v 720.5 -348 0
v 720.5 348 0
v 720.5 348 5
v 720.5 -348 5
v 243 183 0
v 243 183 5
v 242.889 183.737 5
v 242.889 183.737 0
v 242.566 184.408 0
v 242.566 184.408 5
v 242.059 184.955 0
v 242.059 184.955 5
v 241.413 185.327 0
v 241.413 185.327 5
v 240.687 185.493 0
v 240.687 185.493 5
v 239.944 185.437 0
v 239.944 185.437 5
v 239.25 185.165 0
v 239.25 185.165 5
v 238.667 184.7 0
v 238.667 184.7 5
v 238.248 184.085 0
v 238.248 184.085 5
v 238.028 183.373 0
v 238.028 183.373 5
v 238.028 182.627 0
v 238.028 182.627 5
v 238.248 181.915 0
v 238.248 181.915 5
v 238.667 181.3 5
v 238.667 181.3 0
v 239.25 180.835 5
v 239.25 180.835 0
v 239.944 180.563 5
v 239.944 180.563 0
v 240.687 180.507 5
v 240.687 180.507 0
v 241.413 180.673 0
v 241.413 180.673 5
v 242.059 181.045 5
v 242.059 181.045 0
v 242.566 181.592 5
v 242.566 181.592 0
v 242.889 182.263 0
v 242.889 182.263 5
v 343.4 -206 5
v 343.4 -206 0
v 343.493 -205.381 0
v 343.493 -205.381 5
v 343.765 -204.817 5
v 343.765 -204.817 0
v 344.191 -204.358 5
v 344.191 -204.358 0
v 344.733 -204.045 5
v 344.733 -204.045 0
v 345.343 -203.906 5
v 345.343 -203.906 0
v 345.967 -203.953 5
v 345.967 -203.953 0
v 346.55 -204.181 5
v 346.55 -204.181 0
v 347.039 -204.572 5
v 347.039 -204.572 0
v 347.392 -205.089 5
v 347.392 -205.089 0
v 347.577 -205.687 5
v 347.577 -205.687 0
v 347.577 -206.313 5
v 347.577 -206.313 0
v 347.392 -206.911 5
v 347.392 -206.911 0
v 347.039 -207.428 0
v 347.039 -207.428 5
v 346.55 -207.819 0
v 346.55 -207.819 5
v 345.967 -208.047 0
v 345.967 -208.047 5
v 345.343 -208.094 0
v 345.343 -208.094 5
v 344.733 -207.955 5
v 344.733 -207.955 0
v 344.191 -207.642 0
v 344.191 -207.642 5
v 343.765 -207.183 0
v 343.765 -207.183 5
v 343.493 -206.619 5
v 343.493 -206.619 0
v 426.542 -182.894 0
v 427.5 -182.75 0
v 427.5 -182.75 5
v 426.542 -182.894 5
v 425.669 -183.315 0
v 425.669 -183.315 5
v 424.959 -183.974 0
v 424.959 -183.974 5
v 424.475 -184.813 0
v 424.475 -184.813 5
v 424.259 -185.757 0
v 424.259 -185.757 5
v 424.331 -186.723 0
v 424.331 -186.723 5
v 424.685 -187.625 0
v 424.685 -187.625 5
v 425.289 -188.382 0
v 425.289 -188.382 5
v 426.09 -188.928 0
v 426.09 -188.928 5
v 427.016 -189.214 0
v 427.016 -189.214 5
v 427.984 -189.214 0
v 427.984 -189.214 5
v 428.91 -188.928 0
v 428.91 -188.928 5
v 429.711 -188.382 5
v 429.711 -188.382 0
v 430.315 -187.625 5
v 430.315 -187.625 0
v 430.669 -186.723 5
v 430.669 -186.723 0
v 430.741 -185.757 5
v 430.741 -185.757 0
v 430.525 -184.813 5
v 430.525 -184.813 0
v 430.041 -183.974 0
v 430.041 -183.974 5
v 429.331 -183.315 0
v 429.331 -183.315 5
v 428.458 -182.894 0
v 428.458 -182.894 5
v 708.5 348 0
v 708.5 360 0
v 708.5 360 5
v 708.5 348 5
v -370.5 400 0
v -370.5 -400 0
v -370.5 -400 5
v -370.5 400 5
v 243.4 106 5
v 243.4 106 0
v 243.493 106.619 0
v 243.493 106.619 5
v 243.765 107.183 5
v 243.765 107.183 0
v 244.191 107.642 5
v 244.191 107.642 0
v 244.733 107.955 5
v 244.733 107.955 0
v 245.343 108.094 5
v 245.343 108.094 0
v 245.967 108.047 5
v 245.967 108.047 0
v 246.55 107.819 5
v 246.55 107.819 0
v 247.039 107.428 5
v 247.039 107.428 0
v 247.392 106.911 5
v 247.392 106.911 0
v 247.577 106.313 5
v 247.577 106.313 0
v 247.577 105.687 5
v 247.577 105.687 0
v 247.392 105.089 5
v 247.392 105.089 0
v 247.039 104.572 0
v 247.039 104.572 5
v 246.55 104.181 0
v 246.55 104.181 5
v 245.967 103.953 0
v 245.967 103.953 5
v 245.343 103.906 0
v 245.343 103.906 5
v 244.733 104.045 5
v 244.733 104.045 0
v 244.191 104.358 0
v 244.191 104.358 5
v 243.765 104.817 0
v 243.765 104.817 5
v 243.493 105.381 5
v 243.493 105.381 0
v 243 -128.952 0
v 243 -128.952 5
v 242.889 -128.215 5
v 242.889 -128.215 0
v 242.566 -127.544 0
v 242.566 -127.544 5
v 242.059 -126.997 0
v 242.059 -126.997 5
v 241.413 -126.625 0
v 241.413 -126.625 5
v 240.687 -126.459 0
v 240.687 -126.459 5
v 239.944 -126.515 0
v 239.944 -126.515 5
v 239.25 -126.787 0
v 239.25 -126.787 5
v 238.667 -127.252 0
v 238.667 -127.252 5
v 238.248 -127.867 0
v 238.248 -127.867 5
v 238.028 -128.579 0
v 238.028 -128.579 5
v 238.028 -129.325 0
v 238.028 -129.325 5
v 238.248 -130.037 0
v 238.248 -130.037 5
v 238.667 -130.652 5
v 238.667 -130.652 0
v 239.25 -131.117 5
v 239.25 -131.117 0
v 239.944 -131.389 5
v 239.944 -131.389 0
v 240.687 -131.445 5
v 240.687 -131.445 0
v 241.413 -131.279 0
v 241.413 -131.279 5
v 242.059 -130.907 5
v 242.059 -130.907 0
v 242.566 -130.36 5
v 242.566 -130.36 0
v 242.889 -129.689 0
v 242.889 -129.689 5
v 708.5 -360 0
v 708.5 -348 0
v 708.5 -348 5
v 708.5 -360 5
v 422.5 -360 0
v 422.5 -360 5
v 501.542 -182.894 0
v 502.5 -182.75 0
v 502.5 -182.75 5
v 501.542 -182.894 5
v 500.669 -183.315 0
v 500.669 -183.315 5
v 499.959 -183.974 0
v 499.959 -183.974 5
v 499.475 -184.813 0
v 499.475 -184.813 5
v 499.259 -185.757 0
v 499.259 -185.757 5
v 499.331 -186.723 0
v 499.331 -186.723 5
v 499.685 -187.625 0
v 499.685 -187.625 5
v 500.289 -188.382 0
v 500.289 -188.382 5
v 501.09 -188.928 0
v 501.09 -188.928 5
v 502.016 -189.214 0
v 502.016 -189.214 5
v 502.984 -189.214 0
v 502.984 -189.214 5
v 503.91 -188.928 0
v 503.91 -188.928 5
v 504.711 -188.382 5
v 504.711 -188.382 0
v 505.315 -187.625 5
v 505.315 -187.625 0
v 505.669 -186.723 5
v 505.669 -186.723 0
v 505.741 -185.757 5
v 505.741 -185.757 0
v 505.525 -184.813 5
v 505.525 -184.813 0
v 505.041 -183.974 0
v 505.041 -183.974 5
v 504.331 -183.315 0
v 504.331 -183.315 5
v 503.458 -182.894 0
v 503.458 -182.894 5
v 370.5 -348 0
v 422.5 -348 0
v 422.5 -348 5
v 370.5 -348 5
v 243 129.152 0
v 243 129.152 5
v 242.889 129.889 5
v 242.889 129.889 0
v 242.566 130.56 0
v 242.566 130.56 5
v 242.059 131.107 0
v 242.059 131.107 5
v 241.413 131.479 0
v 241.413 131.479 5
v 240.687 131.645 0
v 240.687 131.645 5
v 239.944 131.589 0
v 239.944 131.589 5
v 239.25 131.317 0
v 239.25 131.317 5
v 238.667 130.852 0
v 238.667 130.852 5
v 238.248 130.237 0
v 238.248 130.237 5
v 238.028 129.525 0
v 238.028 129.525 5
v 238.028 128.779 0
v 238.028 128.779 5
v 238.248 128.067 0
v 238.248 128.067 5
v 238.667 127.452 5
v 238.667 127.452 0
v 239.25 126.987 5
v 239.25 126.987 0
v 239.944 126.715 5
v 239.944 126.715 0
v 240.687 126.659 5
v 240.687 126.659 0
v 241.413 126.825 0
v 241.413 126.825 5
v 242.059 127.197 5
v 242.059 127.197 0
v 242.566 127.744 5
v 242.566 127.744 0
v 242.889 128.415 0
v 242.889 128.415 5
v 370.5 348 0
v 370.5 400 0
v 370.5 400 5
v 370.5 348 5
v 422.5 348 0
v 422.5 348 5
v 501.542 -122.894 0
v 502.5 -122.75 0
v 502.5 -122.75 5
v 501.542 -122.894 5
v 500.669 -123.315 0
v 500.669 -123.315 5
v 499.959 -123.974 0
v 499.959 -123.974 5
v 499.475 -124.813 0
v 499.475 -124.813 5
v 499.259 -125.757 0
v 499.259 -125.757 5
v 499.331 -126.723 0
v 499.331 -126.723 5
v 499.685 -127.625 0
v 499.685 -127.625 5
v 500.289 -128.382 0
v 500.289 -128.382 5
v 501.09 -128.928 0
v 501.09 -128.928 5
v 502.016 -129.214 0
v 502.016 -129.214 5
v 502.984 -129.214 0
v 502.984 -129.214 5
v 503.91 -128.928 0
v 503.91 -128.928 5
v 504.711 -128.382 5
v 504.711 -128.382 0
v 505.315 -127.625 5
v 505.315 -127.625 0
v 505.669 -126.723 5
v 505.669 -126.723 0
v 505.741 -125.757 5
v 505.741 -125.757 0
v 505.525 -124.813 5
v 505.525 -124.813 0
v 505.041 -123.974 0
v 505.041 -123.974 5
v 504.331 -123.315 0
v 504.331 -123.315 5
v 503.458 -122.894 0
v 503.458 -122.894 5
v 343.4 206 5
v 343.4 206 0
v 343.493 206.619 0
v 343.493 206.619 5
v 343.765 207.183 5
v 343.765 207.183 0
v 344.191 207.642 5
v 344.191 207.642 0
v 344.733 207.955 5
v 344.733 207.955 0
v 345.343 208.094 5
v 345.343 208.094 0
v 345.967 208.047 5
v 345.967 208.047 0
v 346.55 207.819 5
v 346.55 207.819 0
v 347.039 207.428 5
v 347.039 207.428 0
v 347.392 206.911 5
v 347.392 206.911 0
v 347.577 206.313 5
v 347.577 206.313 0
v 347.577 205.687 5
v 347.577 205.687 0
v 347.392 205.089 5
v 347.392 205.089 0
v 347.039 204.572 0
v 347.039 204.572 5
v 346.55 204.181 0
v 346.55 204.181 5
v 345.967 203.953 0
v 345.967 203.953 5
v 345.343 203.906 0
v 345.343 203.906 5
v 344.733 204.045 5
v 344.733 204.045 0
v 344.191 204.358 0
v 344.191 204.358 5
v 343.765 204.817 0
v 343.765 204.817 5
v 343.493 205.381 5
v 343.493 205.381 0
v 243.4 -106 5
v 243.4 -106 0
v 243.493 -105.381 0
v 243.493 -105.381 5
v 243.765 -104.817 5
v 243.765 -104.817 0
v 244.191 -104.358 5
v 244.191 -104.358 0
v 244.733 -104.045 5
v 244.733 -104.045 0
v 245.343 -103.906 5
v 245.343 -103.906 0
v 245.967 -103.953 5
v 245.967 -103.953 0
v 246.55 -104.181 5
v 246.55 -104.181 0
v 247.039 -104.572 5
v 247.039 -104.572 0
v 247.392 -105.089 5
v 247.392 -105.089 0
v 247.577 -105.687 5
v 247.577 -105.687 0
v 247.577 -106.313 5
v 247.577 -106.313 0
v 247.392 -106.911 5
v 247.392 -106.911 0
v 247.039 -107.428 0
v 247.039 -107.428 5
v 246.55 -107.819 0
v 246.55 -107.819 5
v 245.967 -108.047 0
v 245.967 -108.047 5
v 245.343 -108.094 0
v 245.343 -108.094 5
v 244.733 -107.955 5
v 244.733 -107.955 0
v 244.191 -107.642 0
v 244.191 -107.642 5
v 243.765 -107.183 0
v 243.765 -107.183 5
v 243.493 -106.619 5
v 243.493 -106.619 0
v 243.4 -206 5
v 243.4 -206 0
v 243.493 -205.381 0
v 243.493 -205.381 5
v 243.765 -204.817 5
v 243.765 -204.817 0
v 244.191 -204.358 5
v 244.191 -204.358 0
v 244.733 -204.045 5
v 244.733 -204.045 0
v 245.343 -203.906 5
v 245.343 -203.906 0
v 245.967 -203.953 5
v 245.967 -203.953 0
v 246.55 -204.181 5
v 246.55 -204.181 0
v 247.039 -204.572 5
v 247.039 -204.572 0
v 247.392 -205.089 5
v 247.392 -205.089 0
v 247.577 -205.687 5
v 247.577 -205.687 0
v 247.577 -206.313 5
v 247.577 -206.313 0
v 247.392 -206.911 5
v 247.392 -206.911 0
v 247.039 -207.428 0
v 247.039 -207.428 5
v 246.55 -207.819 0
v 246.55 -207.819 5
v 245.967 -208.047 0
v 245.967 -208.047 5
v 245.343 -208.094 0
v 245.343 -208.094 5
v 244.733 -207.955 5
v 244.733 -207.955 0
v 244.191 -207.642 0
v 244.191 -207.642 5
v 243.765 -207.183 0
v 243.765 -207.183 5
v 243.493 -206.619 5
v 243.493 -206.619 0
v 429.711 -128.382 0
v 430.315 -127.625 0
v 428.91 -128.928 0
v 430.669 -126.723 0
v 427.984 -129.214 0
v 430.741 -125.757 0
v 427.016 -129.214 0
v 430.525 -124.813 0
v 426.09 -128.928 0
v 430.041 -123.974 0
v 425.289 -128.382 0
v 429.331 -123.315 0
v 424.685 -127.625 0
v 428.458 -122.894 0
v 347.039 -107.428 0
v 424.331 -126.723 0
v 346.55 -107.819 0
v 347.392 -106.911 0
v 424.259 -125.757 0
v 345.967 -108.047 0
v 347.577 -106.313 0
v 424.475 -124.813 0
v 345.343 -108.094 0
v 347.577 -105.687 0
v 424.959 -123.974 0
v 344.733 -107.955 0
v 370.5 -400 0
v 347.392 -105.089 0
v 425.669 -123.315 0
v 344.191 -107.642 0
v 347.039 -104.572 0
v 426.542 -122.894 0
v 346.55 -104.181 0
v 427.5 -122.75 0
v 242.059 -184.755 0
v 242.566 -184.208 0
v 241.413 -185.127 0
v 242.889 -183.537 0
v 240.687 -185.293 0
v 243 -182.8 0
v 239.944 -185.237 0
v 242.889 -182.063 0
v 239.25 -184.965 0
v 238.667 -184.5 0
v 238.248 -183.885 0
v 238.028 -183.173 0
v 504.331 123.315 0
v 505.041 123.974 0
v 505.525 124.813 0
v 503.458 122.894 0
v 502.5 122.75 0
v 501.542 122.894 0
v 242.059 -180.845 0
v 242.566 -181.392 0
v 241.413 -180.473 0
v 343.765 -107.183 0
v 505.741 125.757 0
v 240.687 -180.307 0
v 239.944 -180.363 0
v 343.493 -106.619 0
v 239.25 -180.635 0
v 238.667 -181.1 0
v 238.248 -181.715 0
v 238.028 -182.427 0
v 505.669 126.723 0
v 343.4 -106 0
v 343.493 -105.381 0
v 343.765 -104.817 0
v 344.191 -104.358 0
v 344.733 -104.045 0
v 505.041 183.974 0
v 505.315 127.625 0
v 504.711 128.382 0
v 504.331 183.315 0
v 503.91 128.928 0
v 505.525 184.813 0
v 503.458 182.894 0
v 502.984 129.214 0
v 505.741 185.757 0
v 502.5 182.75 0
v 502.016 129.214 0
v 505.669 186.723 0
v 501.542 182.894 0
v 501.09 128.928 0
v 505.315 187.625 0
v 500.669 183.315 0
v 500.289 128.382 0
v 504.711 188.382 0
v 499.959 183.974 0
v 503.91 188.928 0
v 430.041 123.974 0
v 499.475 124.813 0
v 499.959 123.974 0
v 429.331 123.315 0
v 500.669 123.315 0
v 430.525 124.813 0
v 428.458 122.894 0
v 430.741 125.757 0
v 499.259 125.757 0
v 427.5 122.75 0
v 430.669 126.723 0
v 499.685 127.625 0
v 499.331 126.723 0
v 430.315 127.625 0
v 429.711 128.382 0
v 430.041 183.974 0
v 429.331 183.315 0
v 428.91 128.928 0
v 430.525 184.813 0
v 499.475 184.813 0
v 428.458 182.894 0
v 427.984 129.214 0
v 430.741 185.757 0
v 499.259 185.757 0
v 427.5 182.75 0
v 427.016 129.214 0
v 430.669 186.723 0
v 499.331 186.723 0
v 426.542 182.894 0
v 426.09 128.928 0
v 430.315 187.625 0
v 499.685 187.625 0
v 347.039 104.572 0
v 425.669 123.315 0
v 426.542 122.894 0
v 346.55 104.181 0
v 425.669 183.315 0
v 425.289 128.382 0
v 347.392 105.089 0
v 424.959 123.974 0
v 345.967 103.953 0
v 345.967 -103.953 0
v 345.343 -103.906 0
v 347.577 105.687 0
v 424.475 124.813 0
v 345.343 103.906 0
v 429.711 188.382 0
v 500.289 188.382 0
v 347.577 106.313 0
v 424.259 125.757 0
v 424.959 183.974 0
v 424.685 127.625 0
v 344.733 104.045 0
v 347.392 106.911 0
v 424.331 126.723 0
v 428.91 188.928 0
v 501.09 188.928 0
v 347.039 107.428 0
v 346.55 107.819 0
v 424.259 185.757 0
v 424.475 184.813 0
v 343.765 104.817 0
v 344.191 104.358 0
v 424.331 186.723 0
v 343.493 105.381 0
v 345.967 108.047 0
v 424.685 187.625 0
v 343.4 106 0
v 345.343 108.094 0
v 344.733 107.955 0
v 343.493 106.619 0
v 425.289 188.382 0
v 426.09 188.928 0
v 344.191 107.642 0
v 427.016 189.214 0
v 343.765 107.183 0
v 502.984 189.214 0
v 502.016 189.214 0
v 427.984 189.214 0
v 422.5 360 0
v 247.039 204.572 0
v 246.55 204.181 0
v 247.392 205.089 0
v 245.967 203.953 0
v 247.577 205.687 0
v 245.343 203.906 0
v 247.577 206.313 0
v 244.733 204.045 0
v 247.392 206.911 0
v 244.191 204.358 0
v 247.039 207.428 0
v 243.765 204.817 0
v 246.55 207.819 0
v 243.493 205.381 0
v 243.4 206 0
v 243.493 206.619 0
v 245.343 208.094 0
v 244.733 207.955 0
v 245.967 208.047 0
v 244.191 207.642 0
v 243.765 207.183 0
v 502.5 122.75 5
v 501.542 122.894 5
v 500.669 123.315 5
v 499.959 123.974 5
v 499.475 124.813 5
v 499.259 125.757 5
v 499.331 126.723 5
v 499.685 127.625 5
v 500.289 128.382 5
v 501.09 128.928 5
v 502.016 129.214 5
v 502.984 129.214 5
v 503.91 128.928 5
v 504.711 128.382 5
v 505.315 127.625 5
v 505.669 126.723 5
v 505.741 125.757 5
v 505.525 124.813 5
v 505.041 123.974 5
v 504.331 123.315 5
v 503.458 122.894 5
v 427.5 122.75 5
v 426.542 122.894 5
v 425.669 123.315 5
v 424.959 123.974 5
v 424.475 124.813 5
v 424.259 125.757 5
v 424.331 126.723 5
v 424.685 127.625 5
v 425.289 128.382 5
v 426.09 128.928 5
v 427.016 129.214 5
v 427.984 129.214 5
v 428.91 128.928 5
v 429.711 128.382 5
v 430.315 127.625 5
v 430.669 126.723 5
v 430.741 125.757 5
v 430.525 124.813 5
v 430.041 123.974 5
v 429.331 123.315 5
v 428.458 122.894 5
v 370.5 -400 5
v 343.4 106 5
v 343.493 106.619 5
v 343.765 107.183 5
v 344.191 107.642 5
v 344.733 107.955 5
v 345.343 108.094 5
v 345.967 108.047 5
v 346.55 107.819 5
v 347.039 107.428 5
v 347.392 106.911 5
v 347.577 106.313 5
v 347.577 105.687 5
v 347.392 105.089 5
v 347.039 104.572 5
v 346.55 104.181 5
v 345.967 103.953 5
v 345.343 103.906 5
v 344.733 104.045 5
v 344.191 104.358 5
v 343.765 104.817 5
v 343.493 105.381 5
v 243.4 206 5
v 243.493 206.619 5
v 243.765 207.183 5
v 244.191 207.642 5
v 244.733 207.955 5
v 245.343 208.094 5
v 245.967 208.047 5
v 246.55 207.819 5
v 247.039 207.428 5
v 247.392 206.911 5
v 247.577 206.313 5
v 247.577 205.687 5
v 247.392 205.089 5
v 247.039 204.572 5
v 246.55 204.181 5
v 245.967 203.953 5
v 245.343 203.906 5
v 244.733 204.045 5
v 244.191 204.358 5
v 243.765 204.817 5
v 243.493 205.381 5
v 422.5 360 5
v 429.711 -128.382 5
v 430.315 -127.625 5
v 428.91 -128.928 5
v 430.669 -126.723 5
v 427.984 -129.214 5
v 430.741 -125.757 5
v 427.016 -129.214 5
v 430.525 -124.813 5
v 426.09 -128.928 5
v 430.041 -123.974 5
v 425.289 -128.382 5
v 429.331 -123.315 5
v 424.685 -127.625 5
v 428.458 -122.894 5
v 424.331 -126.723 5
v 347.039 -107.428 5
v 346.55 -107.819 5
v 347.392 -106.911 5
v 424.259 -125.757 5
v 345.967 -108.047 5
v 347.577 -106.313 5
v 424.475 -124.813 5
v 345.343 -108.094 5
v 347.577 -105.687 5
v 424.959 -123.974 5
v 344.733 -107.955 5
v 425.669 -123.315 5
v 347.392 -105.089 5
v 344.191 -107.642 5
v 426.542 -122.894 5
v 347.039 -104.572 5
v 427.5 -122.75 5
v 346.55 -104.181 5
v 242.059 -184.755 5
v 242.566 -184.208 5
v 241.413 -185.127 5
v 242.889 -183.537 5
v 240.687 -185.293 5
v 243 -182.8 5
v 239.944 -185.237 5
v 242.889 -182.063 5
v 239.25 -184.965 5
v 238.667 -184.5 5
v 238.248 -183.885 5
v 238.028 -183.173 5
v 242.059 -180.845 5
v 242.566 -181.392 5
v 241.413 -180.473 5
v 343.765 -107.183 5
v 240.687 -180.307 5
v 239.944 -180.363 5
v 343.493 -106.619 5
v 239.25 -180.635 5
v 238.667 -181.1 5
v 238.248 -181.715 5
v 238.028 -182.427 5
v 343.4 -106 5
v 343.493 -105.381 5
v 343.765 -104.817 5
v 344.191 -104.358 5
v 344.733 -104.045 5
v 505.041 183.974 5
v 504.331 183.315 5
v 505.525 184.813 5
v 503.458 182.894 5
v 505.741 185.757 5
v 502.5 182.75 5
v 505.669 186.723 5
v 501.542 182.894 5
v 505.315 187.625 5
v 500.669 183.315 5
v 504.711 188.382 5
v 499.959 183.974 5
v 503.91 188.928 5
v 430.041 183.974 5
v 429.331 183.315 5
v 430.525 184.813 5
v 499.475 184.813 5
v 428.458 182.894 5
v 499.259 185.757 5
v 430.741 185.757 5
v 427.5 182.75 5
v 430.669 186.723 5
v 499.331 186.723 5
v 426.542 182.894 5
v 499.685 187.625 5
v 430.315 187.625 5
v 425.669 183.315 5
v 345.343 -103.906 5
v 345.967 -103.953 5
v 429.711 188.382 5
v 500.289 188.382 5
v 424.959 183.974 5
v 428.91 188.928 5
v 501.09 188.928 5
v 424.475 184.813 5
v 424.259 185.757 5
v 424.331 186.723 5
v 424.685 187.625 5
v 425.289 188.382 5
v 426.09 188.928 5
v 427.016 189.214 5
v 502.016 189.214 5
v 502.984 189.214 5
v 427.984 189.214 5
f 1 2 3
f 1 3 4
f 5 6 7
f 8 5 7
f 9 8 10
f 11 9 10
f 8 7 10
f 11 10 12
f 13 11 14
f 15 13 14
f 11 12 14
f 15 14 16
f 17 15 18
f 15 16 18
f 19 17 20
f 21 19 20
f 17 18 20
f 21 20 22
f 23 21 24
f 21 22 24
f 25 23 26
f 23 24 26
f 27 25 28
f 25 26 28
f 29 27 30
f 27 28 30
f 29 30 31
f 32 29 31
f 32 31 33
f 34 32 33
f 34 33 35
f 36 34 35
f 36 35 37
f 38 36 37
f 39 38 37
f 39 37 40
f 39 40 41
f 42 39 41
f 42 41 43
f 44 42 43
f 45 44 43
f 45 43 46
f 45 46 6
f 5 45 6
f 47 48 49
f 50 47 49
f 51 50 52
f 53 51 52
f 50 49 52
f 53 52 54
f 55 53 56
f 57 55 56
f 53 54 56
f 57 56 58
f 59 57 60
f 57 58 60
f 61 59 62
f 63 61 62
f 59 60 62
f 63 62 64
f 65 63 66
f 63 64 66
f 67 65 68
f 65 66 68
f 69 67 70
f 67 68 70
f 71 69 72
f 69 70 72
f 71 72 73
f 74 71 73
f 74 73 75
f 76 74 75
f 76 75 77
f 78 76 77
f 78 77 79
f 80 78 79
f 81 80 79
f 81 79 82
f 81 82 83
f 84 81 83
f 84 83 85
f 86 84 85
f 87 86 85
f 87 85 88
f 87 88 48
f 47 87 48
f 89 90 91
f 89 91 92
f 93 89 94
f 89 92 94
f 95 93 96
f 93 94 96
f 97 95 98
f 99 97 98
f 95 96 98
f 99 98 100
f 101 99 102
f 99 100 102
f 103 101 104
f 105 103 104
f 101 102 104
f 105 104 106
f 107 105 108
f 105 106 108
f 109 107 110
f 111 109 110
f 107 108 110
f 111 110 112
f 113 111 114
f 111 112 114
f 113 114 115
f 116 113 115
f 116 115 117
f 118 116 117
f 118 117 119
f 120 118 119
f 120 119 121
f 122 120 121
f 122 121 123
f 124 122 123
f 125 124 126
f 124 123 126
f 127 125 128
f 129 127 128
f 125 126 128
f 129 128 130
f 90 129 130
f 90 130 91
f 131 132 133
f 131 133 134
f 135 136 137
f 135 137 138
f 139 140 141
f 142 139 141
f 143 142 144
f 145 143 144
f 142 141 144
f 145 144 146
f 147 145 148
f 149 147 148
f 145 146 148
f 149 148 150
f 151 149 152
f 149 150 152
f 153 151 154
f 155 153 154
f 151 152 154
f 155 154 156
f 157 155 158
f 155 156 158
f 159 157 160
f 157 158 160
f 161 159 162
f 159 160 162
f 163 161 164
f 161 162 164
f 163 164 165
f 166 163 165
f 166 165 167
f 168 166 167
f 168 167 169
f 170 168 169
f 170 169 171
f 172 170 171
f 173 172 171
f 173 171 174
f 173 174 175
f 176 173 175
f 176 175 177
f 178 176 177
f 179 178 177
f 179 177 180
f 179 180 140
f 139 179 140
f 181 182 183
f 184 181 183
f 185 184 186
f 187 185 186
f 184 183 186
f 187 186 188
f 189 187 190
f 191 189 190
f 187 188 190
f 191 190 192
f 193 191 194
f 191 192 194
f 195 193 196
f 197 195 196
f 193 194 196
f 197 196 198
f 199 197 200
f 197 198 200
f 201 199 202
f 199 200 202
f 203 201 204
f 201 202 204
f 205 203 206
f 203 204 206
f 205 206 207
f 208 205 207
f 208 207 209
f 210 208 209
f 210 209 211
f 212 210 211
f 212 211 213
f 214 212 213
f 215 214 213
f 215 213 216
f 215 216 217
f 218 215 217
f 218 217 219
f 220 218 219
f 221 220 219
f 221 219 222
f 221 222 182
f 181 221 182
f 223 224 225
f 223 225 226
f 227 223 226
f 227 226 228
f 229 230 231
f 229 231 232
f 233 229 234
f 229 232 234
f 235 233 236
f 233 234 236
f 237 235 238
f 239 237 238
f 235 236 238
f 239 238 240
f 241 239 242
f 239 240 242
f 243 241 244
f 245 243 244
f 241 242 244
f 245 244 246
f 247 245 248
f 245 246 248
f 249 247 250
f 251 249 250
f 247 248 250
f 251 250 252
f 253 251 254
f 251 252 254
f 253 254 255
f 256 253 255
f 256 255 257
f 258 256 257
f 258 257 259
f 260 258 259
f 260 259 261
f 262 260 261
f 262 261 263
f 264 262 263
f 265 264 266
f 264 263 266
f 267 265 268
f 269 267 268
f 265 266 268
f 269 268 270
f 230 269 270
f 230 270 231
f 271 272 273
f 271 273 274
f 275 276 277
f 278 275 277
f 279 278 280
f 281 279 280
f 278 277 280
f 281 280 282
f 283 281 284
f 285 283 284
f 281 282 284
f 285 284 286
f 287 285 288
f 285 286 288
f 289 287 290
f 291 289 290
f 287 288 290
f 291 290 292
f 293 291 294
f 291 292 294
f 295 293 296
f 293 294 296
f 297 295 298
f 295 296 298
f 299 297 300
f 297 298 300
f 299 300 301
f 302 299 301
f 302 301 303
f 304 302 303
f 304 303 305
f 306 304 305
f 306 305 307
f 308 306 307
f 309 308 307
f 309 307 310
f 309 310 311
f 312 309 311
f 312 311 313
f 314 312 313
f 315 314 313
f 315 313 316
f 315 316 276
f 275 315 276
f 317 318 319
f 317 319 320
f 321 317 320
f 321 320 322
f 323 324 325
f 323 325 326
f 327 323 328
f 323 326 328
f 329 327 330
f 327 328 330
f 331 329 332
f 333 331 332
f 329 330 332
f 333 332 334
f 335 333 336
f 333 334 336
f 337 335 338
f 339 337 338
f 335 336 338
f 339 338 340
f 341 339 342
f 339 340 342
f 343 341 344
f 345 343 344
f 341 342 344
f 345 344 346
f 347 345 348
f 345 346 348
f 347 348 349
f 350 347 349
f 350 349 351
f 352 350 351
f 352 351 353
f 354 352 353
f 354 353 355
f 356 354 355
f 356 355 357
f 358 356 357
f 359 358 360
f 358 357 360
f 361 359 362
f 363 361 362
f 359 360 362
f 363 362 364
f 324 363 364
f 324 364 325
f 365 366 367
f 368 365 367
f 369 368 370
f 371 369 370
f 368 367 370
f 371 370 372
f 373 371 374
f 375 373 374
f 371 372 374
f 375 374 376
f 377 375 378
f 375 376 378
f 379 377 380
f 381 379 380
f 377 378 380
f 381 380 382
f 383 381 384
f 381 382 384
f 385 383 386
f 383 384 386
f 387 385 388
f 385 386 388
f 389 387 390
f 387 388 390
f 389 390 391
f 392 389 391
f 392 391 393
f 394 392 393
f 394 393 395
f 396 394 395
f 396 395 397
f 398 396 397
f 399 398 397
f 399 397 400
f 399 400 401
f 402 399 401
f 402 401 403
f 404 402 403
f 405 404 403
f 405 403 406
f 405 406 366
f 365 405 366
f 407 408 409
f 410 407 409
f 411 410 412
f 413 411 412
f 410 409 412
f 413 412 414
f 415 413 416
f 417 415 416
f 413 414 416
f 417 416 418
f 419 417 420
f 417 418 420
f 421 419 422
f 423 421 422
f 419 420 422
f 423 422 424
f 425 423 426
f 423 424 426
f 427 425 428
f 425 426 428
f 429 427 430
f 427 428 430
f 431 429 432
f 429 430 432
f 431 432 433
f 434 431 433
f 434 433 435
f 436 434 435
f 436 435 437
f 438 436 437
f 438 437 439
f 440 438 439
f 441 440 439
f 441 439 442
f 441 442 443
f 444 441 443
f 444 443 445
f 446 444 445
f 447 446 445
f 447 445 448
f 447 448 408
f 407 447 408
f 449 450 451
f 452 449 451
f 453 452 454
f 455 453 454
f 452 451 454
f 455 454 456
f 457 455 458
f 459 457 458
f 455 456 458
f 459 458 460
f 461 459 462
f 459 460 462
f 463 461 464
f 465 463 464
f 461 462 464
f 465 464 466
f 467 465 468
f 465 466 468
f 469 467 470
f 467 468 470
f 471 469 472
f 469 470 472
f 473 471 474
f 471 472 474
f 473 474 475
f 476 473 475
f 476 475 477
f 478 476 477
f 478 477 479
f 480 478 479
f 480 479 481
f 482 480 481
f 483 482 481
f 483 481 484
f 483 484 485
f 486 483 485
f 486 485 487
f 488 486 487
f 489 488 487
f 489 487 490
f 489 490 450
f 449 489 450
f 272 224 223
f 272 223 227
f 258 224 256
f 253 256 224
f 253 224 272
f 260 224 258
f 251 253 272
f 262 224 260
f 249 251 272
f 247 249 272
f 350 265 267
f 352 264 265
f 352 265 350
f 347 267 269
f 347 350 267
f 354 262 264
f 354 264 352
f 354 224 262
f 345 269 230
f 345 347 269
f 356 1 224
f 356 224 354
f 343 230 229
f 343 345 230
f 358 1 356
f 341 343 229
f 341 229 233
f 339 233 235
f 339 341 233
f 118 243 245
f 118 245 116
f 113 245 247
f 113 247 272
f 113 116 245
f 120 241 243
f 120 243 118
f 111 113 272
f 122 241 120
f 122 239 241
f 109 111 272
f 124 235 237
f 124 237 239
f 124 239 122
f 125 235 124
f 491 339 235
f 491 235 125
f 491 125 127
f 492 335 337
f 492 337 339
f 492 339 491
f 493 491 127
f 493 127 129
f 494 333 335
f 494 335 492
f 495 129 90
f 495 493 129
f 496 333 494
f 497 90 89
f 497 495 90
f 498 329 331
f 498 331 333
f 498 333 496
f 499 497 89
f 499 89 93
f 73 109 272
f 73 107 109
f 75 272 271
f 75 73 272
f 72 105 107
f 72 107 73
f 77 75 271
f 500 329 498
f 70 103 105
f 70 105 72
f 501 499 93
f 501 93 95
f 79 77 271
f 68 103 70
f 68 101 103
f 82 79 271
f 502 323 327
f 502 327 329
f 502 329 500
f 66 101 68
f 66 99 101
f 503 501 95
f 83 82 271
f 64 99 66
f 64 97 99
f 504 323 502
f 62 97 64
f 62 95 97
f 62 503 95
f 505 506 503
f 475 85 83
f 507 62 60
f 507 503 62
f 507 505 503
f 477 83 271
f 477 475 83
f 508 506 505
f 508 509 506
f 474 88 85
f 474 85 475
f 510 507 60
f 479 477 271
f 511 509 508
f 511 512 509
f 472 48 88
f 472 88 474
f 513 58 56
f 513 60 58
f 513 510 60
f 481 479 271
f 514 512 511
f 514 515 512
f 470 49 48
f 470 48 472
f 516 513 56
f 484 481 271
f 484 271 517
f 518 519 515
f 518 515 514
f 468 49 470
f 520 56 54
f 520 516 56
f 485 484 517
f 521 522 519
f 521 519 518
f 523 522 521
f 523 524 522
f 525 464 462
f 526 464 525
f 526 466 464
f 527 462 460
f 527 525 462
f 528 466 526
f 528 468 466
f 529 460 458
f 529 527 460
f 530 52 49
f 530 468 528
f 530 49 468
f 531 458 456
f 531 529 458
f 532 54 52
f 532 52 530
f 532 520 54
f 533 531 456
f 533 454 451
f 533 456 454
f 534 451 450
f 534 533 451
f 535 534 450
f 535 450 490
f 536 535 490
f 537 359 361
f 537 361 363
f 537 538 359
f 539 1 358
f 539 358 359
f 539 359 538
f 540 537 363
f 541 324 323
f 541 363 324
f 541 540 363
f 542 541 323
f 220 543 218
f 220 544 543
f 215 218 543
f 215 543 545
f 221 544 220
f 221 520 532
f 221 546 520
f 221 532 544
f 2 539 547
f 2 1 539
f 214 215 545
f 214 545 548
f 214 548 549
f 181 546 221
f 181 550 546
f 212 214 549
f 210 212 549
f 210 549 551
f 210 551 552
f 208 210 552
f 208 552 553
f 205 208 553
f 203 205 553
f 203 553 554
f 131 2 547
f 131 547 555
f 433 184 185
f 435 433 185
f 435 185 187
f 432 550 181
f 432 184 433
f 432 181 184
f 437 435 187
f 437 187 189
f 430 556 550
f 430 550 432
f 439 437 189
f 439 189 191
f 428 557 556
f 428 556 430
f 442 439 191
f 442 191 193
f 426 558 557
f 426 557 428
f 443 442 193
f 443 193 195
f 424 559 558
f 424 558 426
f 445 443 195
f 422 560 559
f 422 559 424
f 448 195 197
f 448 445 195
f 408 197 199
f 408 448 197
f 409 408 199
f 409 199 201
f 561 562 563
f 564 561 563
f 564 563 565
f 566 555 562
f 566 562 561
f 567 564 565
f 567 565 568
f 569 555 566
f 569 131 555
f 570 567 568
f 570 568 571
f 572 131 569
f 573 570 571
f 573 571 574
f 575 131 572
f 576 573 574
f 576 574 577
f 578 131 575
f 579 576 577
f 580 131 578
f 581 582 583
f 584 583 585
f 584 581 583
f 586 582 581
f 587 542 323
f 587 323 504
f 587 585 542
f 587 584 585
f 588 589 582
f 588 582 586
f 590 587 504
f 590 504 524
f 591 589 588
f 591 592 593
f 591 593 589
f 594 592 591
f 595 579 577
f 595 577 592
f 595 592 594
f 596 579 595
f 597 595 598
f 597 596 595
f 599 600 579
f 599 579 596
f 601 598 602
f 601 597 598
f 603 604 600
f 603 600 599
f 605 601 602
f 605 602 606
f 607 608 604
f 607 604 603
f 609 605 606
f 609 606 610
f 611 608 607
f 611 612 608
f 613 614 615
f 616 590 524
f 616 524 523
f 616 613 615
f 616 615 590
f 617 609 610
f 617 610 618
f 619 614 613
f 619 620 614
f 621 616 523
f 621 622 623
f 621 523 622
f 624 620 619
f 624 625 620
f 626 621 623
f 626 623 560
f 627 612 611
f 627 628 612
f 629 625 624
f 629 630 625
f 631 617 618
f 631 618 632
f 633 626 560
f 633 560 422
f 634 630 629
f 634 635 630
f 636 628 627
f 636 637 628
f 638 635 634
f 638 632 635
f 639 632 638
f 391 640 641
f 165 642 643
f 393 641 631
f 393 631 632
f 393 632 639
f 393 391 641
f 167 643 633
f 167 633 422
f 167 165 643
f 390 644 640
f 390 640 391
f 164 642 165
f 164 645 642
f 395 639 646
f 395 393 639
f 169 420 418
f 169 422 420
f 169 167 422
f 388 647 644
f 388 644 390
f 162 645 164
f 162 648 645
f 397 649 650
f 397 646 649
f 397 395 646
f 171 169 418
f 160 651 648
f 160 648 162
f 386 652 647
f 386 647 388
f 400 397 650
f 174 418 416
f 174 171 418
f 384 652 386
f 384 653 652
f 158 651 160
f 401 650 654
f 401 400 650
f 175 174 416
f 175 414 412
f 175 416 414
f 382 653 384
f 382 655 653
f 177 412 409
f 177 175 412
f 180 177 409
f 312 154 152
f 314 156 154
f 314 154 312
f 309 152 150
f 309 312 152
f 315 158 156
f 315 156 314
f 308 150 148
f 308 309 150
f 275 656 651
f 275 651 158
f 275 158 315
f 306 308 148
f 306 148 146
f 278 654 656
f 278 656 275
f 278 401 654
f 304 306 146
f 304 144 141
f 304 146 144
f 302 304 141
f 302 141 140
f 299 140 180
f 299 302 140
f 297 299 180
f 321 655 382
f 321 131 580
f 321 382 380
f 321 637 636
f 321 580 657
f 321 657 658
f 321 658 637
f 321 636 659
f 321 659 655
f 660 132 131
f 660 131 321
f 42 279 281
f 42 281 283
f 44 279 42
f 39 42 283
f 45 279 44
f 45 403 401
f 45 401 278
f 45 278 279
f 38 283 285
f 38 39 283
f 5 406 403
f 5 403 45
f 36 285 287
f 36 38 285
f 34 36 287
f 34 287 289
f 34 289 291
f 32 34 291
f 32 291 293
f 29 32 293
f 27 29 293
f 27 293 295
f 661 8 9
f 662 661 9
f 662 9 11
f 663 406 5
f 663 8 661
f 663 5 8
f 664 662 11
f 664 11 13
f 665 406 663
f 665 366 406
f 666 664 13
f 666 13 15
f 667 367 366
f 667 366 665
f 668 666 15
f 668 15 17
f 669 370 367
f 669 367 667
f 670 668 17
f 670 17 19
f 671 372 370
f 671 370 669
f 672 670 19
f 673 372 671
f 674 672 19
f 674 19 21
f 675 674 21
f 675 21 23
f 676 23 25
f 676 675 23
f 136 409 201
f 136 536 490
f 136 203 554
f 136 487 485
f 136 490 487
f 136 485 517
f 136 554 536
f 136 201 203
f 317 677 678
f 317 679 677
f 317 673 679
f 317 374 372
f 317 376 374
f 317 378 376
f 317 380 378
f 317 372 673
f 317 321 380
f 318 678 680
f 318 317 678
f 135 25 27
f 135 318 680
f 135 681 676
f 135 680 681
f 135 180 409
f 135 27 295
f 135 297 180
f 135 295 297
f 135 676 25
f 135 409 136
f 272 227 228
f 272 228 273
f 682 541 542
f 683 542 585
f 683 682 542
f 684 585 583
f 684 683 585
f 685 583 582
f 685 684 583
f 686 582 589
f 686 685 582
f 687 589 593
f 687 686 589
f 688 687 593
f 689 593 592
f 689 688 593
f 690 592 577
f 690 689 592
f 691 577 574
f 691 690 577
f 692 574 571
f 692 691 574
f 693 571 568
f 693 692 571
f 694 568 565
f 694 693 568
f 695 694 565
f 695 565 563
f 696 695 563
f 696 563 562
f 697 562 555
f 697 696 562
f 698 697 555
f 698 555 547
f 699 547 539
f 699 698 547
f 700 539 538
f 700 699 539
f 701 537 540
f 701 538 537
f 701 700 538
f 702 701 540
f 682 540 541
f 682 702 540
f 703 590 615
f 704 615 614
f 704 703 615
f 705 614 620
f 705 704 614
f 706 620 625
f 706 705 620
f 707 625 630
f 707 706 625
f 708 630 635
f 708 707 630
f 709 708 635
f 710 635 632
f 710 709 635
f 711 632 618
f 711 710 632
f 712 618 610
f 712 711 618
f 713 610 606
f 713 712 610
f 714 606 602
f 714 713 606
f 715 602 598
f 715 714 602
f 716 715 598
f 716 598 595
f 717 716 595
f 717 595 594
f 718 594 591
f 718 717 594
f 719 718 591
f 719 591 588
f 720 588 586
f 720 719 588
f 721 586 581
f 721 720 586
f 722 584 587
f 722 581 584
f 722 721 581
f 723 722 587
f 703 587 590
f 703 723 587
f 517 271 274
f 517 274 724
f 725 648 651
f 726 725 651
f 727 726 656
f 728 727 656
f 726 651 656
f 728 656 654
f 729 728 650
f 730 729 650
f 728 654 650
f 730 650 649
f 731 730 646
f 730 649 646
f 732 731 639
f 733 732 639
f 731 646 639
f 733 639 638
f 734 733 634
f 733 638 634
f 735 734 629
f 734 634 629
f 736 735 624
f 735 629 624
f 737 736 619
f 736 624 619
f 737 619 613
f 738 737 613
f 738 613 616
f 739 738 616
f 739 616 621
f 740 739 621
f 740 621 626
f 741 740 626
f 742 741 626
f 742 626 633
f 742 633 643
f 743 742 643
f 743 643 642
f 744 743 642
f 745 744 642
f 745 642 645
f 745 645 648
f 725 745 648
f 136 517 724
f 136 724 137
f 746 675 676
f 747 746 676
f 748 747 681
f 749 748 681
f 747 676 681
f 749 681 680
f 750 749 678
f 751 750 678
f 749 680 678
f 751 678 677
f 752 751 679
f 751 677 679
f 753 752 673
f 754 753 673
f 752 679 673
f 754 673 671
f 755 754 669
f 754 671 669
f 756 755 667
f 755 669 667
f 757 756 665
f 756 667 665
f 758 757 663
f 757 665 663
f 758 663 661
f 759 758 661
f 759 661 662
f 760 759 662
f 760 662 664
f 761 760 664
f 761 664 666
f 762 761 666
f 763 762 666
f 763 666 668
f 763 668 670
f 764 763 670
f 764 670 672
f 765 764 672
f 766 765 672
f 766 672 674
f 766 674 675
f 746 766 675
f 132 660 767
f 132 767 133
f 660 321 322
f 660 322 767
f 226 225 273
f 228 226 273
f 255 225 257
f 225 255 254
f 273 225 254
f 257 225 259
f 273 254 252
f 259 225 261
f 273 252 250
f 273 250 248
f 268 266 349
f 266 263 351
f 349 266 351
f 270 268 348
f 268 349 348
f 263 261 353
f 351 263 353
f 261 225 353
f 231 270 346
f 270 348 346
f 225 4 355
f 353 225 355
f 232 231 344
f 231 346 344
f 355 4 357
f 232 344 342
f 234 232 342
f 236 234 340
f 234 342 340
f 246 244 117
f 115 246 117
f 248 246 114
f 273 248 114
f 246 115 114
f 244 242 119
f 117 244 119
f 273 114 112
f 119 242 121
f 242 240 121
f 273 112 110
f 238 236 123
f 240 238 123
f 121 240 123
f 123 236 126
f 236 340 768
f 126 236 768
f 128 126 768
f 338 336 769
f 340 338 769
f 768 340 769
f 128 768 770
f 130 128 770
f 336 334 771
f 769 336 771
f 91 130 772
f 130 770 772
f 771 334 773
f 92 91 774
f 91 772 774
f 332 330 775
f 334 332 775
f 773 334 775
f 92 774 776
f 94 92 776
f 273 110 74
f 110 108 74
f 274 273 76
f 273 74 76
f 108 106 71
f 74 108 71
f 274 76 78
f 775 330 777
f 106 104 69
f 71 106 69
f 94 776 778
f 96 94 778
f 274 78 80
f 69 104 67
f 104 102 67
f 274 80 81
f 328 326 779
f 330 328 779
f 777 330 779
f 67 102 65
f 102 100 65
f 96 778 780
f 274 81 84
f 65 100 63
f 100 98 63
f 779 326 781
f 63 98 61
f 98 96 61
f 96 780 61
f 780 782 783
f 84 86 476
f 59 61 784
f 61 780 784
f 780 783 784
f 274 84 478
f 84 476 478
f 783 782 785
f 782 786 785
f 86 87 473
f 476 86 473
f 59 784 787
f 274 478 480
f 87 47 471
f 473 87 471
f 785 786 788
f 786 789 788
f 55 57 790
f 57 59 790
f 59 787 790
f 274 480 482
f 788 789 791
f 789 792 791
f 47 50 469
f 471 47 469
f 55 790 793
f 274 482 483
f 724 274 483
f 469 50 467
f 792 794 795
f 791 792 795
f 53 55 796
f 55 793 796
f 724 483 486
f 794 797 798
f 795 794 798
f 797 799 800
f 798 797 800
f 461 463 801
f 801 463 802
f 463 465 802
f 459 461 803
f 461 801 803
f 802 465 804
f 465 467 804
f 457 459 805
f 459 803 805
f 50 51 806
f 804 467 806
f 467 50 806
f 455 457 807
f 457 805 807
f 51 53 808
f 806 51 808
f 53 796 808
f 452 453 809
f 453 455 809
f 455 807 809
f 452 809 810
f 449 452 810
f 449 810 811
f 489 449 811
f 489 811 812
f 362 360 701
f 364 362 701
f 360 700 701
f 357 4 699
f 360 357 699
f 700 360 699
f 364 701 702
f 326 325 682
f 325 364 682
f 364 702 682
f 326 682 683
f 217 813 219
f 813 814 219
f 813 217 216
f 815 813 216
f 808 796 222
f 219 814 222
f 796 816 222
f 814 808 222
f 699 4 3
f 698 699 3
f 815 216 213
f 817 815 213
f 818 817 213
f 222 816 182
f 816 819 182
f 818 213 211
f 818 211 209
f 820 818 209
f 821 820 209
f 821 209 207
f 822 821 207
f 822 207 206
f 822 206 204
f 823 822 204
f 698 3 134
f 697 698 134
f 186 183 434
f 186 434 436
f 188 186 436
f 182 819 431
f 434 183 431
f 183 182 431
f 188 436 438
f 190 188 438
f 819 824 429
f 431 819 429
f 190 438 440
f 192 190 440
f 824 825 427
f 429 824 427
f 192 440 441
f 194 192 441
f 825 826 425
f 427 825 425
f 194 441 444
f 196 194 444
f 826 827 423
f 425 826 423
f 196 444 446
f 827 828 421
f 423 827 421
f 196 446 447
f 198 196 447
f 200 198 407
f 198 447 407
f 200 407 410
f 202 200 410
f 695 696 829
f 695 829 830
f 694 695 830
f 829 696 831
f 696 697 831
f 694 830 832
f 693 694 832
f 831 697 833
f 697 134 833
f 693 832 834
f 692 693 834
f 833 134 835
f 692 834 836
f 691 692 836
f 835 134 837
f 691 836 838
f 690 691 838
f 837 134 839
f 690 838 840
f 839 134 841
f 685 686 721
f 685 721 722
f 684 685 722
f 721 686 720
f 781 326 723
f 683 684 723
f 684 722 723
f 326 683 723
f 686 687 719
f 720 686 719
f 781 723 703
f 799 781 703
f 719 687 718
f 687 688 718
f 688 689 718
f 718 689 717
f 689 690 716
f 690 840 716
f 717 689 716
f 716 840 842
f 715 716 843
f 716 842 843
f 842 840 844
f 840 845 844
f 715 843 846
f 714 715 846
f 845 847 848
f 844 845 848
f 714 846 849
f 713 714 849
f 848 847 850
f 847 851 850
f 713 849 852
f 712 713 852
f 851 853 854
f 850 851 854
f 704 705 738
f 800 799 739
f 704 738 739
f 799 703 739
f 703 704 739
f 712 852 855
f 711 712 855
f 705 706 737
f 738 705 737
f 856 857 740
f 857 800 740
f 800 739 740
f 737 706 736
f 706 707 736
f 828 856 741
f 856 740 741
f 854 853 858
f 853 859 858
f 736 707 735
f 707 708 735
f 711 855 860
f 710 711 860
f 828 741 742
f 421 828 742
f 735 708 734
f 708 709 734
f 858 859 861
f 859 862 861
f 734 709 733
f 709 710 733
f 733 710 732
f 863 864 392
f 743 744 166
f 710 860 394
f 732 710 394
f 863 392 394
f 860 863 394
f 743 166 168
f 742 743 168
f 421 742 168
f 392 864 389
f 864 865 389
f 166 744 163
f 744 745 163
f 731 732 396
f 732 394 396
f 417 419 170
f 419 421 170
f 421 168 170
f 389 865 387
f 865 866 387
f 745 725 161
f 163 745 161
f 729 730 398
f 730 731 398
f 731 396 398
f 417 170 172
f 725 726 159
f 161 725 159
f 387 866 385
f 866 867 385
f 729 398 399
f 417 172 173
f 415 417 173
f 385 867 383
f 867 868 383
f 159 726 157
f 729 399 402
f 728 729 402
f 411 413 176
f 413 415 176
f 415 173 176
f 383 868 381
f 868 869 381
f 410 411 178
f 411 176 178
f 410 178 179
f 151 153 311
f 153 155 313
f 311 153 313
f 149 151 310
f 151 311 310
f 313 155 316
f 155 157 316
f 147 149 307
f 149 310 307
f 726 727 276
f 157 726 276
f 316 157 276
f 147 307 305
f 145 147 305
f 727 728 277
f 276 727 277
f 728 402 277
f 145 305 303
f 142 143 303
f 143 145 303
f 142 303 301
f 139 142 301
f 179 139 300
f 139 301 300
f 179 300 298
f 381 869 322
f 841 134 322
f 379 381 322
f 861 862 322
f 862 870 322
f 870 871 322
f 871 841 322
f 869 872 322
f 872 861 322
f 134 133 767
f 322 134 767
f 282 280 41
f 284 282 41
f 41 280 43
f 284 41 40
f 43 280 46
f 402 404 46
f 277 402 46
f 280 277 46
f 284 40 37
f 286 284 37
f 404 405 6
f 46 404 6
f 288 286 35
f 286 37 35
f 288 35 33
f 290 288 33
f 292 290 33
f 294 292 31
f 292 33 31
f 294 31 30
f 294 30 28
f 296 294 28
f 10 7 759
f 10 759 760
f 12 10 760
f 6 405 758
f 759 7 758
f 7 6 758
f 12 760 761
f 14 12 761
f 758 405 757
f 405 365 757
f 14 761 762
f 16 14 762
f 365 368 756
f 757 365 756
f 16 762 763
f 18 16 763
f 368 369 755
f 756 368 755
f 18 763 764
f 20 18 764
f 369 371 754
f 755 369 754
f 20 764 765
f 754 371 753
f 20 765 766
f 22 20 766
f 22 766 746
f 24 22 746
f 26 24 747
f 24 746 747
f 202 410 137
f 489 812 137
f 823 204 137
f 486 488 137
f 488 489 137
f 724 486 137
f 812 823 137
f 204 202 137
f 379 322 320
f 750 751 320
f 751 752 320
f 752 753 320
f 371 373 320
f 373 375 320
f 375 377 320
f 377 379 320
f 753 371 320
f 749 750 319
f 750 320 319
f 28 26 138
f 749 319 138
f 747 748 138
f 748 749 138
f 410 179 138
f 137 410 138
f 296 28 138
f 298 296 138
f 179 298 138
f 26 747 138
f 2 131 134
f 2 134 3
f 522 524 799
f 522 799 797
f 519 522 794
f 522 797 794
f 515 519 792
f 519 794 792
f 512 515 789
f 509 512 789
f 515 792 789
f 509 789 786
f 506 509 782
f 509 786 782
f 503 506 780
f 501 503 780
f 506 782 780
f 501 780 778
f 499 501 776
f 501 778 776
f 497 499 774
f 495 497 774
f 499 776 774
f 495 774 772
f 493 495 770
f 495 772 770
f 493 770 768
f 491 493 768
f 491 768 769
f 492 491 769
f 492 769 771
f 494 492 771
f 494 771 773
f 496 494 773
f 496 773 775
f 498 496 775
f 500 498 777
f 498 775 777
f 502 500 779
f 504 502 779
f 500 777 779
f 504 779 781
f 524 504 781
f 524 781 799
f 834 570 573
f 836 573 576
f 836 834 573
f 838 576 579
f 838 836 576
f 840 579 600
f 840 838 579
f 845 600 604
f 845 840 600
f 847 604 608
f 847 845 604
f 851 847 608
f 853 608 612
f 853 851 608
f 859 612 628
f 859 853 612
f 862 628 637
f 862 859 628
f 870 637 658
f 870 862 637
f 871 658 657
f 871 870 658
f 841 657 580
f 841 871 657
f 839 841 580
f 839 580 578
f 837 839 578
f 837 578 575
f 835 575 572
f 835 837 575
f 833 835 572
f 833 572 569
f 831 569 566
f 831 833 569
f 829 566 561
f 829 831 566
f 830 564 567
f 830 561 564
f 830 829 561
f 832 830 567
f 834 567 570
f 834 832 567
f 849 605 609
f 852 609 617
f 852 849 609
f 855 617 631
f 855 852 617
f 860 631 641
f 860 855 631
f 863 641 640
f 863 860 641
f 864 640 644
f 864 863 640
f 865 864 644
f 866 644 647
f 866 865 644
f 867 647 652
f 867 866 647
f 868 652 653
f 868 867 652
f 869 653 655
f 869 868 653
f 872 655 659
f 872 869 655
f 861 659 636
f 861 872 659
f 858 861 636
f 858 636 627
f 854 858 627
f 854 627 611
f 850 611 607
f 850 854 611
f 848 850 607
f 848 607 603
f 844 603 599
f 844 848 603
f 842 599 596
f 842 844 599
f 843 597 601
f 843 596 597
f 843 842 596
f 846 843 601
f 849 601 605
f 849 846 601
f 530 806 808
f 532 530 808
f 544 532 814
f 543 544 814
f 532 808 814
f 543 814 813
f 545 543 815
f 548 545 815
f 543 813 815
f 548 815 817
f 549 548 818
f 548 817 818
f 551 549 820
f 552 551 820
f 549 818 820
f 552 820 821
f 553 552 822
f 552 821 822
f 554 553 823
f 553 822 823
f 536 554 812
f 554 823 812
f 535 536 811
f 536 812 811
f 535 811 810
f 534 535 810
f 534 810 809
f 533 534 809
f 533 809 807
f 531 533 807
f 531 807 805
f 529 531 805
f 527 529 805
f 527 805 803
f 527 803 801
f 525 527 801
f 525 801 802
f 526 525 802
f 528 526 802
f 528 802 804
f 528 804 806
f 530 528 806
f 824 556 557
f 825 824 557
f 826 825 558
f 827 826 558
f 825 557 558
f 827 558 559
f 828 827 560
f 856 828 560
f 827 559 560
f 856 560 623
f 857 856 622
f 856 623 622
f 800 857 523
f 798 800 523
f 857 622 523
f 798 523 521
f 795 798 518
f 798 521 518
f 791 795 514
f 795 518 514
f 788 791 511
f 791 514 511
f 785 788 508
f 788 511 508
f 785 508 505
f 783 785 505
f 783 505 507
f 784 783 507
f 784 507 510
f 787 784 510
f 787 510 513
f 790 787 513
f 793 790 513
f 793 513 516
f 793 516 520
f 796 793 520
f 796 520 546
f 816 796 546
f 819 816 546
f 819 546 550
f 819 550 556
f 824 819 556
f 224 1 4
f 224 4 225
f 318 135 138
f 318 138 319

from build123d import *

# Parameters (mm, degrees)
LINEAR_AUSTRAGEN1_DEPTH         = 5
M5X0_8_GEWINDEKERNLOCH1_D       = 4.2
M5X0_8_GEWINDEKERNLOCH1_DEPTH   = 14
M5X0_8_GEWINDEKERNLOCH1_TIP     = 1.2618073
SKIZZE5_R                       = 2.5
SCHNITT_LINEAR_AUSTRAGEN1_DEPTH = 825.102693843
LINEARES_MUSTER1_COUNT          = 2
LINEARES_MUSTER1_PITCH          = 60
LINEARES_MUSTER1_COUNT_DIR2     = 2
LINEARES_MUSTER1_PITCH_DIR2     = 75


with BuildPart() as part:
    # Skizze1 → Linear austragen1 (new body)
    with BuildSketch(Plane.XY):
        Polygon((-370.5, 400), (370.5, 400), (370.5, 348), (422.5, 348), (422.5, 360), (708.5, 360), (708.5, 348), (720.5, 348), (720.5, -348), (708.5, -348), (708.5, -360), (422.5, -360), (422.5, -348), (370.5, -348), (370.5, -400), (-370.5, -400), align=None)
    extrude(amount=LINEAR_AUSTRAGEN1_DEPTH)

    # M5x0.8 Gewindekernloch1
    with Locations(Plane(origin=(345.5, 206, 5), x_dir=(1, 0, 0), z_dir=(0, 0, 1))):
        with Locations((0, 0), (-100, 0), (-100, -100), (0, -100), (0, -312), (-100, -312), (0, -412), (-100, -412)):
            Hole(M5X0_8_GEWINDEKERNLOCH1_D / 2, depth=M5X0_8_GEWINDEKERNLOCH1_DEPTH)
            with Locations((0, 0, -(M5X0_8_GEWINDEKERNLOCH1_DEPTH + M5X0_8_GEWINDEKERNLOCH1_TIP / 2))):  # 118° drill point
                Cone(0, M5X0_8_GEWINDEKERNLOCH1_D / 2, M5X0_8_GEWINDEKERNLOCH1_TIP, mode=Mode.SUBTRACT)

    # Skizze5 → Schnitt-Linear austragen1 (cut, through all)
    with BuildSketch(Plane.XY.offset(5)):
        with Locations((240.5, 183)):
            Circle(SKIZZE5_R)
        with Locations((240.5, 129.152)):
            Circle(SKIZZE5_R)
        with Locations((240.5, -128.952)):
            Circle(SKIZZE5_R)
        with Locations((240.5, -182.8)):
            Circle(SKIZZE5_R)
    extrude(amount=-SCHNITT_LINEAR_AUSTRAGEN1_DEPTH, mode=Mode.SUBTRACT)

    # Skizze8 → Ø6.5 (6.5) Durchmesser Bohrung1 (revolve, cut)
    with BuildSketch(Plane(origin=(427.5, 186, 5), x_dir=(0, -1, 0), z_dir=(1, 0, 0))):
        Polygon((0, 0), (0, 21.952797012), (3.25, 20), (3.25, 0), align=None)
    f_6_5_6_5_durchmesser_bohrung1 = revolve(axis=Axis((427.5, 186, 11.35), (0, 0, -1)), mode=Mode.SUBTRACT)

    # Lineares Muster1: 6.5 _6.5_ Durchmesser Bohrung1 2 × 2
    with Locations(*[(j * LINEARES_MUSTER1_PITCH_DIR2, -i * LINEARES_MUSTER1_PITCH, 0) for i in range(LINEARES_MUSTER1_COUNT) for j in range(LINEARES_MUSTER1_COUNT_DIR2) if (i, j) != (0, 0)]):
        add(f_6_5_6_5_durchmesser_bohrung1, mode=Mode.SUBTRACT)

    # Spiegeln1: Ø6.5 (6.5) Durchmesser Bohrung1 across plane
    add(f_6_5_6_5_durchmesser_bohrung1.mirror(Plane.ZX), mode=Mode.SUBTRACT)

    # Spiegeln1 copy 1 sketch → Spiegeln1 copy 1 (revolve, cut)
    with BuildSketch(Plane(origin=(502.5, -186, 5), x_dir=(0, 1, 0), z_dir=(1, 0, 0))):
        Polygon((0, 0), (0, -21.952797012), (3.25, -20), (3.25, 0), align=None)
    revolve(axis=Axis((502.5, -186, 11.35), (0, 0, 1)), mode=Mode.SUBTRACT)

    # Spiegeln1 copy 2 sketch → Spiegeln1 copy 2 (revolve, cut)
    with BuildSketch(Plane(origin=(427.5, -126, 5), x_dir=(0, 1, 0), z_dir=(1, 0, 0))):
        Polygon((0, 0), (0, -21.952797012), (3.25, -20), (3.25, 0), align=None)
    revolve(axis=Axis((427.5, -126, 11.35), (0, 0, 1)), mode=Mode.SUBTRACT)

    # Spiegeln1 copy 3 sketch → Spiegeln1 copy 3 (revolve, cut)
    with BuildSketch(Plane(origin=(502.5, -126, 5), x_dir=(0, 1, 0), z_dir=(1, 0, 0))):
        Polygon((0, 0), (0, -21.952797012), (3.25, -20), (3.25, 0), align=None)
    revolve(axis=Axis((502.5, -126, 11.35), (0, 0, 1)), mode=Mode.SUBTRACT)


solid = part.part
